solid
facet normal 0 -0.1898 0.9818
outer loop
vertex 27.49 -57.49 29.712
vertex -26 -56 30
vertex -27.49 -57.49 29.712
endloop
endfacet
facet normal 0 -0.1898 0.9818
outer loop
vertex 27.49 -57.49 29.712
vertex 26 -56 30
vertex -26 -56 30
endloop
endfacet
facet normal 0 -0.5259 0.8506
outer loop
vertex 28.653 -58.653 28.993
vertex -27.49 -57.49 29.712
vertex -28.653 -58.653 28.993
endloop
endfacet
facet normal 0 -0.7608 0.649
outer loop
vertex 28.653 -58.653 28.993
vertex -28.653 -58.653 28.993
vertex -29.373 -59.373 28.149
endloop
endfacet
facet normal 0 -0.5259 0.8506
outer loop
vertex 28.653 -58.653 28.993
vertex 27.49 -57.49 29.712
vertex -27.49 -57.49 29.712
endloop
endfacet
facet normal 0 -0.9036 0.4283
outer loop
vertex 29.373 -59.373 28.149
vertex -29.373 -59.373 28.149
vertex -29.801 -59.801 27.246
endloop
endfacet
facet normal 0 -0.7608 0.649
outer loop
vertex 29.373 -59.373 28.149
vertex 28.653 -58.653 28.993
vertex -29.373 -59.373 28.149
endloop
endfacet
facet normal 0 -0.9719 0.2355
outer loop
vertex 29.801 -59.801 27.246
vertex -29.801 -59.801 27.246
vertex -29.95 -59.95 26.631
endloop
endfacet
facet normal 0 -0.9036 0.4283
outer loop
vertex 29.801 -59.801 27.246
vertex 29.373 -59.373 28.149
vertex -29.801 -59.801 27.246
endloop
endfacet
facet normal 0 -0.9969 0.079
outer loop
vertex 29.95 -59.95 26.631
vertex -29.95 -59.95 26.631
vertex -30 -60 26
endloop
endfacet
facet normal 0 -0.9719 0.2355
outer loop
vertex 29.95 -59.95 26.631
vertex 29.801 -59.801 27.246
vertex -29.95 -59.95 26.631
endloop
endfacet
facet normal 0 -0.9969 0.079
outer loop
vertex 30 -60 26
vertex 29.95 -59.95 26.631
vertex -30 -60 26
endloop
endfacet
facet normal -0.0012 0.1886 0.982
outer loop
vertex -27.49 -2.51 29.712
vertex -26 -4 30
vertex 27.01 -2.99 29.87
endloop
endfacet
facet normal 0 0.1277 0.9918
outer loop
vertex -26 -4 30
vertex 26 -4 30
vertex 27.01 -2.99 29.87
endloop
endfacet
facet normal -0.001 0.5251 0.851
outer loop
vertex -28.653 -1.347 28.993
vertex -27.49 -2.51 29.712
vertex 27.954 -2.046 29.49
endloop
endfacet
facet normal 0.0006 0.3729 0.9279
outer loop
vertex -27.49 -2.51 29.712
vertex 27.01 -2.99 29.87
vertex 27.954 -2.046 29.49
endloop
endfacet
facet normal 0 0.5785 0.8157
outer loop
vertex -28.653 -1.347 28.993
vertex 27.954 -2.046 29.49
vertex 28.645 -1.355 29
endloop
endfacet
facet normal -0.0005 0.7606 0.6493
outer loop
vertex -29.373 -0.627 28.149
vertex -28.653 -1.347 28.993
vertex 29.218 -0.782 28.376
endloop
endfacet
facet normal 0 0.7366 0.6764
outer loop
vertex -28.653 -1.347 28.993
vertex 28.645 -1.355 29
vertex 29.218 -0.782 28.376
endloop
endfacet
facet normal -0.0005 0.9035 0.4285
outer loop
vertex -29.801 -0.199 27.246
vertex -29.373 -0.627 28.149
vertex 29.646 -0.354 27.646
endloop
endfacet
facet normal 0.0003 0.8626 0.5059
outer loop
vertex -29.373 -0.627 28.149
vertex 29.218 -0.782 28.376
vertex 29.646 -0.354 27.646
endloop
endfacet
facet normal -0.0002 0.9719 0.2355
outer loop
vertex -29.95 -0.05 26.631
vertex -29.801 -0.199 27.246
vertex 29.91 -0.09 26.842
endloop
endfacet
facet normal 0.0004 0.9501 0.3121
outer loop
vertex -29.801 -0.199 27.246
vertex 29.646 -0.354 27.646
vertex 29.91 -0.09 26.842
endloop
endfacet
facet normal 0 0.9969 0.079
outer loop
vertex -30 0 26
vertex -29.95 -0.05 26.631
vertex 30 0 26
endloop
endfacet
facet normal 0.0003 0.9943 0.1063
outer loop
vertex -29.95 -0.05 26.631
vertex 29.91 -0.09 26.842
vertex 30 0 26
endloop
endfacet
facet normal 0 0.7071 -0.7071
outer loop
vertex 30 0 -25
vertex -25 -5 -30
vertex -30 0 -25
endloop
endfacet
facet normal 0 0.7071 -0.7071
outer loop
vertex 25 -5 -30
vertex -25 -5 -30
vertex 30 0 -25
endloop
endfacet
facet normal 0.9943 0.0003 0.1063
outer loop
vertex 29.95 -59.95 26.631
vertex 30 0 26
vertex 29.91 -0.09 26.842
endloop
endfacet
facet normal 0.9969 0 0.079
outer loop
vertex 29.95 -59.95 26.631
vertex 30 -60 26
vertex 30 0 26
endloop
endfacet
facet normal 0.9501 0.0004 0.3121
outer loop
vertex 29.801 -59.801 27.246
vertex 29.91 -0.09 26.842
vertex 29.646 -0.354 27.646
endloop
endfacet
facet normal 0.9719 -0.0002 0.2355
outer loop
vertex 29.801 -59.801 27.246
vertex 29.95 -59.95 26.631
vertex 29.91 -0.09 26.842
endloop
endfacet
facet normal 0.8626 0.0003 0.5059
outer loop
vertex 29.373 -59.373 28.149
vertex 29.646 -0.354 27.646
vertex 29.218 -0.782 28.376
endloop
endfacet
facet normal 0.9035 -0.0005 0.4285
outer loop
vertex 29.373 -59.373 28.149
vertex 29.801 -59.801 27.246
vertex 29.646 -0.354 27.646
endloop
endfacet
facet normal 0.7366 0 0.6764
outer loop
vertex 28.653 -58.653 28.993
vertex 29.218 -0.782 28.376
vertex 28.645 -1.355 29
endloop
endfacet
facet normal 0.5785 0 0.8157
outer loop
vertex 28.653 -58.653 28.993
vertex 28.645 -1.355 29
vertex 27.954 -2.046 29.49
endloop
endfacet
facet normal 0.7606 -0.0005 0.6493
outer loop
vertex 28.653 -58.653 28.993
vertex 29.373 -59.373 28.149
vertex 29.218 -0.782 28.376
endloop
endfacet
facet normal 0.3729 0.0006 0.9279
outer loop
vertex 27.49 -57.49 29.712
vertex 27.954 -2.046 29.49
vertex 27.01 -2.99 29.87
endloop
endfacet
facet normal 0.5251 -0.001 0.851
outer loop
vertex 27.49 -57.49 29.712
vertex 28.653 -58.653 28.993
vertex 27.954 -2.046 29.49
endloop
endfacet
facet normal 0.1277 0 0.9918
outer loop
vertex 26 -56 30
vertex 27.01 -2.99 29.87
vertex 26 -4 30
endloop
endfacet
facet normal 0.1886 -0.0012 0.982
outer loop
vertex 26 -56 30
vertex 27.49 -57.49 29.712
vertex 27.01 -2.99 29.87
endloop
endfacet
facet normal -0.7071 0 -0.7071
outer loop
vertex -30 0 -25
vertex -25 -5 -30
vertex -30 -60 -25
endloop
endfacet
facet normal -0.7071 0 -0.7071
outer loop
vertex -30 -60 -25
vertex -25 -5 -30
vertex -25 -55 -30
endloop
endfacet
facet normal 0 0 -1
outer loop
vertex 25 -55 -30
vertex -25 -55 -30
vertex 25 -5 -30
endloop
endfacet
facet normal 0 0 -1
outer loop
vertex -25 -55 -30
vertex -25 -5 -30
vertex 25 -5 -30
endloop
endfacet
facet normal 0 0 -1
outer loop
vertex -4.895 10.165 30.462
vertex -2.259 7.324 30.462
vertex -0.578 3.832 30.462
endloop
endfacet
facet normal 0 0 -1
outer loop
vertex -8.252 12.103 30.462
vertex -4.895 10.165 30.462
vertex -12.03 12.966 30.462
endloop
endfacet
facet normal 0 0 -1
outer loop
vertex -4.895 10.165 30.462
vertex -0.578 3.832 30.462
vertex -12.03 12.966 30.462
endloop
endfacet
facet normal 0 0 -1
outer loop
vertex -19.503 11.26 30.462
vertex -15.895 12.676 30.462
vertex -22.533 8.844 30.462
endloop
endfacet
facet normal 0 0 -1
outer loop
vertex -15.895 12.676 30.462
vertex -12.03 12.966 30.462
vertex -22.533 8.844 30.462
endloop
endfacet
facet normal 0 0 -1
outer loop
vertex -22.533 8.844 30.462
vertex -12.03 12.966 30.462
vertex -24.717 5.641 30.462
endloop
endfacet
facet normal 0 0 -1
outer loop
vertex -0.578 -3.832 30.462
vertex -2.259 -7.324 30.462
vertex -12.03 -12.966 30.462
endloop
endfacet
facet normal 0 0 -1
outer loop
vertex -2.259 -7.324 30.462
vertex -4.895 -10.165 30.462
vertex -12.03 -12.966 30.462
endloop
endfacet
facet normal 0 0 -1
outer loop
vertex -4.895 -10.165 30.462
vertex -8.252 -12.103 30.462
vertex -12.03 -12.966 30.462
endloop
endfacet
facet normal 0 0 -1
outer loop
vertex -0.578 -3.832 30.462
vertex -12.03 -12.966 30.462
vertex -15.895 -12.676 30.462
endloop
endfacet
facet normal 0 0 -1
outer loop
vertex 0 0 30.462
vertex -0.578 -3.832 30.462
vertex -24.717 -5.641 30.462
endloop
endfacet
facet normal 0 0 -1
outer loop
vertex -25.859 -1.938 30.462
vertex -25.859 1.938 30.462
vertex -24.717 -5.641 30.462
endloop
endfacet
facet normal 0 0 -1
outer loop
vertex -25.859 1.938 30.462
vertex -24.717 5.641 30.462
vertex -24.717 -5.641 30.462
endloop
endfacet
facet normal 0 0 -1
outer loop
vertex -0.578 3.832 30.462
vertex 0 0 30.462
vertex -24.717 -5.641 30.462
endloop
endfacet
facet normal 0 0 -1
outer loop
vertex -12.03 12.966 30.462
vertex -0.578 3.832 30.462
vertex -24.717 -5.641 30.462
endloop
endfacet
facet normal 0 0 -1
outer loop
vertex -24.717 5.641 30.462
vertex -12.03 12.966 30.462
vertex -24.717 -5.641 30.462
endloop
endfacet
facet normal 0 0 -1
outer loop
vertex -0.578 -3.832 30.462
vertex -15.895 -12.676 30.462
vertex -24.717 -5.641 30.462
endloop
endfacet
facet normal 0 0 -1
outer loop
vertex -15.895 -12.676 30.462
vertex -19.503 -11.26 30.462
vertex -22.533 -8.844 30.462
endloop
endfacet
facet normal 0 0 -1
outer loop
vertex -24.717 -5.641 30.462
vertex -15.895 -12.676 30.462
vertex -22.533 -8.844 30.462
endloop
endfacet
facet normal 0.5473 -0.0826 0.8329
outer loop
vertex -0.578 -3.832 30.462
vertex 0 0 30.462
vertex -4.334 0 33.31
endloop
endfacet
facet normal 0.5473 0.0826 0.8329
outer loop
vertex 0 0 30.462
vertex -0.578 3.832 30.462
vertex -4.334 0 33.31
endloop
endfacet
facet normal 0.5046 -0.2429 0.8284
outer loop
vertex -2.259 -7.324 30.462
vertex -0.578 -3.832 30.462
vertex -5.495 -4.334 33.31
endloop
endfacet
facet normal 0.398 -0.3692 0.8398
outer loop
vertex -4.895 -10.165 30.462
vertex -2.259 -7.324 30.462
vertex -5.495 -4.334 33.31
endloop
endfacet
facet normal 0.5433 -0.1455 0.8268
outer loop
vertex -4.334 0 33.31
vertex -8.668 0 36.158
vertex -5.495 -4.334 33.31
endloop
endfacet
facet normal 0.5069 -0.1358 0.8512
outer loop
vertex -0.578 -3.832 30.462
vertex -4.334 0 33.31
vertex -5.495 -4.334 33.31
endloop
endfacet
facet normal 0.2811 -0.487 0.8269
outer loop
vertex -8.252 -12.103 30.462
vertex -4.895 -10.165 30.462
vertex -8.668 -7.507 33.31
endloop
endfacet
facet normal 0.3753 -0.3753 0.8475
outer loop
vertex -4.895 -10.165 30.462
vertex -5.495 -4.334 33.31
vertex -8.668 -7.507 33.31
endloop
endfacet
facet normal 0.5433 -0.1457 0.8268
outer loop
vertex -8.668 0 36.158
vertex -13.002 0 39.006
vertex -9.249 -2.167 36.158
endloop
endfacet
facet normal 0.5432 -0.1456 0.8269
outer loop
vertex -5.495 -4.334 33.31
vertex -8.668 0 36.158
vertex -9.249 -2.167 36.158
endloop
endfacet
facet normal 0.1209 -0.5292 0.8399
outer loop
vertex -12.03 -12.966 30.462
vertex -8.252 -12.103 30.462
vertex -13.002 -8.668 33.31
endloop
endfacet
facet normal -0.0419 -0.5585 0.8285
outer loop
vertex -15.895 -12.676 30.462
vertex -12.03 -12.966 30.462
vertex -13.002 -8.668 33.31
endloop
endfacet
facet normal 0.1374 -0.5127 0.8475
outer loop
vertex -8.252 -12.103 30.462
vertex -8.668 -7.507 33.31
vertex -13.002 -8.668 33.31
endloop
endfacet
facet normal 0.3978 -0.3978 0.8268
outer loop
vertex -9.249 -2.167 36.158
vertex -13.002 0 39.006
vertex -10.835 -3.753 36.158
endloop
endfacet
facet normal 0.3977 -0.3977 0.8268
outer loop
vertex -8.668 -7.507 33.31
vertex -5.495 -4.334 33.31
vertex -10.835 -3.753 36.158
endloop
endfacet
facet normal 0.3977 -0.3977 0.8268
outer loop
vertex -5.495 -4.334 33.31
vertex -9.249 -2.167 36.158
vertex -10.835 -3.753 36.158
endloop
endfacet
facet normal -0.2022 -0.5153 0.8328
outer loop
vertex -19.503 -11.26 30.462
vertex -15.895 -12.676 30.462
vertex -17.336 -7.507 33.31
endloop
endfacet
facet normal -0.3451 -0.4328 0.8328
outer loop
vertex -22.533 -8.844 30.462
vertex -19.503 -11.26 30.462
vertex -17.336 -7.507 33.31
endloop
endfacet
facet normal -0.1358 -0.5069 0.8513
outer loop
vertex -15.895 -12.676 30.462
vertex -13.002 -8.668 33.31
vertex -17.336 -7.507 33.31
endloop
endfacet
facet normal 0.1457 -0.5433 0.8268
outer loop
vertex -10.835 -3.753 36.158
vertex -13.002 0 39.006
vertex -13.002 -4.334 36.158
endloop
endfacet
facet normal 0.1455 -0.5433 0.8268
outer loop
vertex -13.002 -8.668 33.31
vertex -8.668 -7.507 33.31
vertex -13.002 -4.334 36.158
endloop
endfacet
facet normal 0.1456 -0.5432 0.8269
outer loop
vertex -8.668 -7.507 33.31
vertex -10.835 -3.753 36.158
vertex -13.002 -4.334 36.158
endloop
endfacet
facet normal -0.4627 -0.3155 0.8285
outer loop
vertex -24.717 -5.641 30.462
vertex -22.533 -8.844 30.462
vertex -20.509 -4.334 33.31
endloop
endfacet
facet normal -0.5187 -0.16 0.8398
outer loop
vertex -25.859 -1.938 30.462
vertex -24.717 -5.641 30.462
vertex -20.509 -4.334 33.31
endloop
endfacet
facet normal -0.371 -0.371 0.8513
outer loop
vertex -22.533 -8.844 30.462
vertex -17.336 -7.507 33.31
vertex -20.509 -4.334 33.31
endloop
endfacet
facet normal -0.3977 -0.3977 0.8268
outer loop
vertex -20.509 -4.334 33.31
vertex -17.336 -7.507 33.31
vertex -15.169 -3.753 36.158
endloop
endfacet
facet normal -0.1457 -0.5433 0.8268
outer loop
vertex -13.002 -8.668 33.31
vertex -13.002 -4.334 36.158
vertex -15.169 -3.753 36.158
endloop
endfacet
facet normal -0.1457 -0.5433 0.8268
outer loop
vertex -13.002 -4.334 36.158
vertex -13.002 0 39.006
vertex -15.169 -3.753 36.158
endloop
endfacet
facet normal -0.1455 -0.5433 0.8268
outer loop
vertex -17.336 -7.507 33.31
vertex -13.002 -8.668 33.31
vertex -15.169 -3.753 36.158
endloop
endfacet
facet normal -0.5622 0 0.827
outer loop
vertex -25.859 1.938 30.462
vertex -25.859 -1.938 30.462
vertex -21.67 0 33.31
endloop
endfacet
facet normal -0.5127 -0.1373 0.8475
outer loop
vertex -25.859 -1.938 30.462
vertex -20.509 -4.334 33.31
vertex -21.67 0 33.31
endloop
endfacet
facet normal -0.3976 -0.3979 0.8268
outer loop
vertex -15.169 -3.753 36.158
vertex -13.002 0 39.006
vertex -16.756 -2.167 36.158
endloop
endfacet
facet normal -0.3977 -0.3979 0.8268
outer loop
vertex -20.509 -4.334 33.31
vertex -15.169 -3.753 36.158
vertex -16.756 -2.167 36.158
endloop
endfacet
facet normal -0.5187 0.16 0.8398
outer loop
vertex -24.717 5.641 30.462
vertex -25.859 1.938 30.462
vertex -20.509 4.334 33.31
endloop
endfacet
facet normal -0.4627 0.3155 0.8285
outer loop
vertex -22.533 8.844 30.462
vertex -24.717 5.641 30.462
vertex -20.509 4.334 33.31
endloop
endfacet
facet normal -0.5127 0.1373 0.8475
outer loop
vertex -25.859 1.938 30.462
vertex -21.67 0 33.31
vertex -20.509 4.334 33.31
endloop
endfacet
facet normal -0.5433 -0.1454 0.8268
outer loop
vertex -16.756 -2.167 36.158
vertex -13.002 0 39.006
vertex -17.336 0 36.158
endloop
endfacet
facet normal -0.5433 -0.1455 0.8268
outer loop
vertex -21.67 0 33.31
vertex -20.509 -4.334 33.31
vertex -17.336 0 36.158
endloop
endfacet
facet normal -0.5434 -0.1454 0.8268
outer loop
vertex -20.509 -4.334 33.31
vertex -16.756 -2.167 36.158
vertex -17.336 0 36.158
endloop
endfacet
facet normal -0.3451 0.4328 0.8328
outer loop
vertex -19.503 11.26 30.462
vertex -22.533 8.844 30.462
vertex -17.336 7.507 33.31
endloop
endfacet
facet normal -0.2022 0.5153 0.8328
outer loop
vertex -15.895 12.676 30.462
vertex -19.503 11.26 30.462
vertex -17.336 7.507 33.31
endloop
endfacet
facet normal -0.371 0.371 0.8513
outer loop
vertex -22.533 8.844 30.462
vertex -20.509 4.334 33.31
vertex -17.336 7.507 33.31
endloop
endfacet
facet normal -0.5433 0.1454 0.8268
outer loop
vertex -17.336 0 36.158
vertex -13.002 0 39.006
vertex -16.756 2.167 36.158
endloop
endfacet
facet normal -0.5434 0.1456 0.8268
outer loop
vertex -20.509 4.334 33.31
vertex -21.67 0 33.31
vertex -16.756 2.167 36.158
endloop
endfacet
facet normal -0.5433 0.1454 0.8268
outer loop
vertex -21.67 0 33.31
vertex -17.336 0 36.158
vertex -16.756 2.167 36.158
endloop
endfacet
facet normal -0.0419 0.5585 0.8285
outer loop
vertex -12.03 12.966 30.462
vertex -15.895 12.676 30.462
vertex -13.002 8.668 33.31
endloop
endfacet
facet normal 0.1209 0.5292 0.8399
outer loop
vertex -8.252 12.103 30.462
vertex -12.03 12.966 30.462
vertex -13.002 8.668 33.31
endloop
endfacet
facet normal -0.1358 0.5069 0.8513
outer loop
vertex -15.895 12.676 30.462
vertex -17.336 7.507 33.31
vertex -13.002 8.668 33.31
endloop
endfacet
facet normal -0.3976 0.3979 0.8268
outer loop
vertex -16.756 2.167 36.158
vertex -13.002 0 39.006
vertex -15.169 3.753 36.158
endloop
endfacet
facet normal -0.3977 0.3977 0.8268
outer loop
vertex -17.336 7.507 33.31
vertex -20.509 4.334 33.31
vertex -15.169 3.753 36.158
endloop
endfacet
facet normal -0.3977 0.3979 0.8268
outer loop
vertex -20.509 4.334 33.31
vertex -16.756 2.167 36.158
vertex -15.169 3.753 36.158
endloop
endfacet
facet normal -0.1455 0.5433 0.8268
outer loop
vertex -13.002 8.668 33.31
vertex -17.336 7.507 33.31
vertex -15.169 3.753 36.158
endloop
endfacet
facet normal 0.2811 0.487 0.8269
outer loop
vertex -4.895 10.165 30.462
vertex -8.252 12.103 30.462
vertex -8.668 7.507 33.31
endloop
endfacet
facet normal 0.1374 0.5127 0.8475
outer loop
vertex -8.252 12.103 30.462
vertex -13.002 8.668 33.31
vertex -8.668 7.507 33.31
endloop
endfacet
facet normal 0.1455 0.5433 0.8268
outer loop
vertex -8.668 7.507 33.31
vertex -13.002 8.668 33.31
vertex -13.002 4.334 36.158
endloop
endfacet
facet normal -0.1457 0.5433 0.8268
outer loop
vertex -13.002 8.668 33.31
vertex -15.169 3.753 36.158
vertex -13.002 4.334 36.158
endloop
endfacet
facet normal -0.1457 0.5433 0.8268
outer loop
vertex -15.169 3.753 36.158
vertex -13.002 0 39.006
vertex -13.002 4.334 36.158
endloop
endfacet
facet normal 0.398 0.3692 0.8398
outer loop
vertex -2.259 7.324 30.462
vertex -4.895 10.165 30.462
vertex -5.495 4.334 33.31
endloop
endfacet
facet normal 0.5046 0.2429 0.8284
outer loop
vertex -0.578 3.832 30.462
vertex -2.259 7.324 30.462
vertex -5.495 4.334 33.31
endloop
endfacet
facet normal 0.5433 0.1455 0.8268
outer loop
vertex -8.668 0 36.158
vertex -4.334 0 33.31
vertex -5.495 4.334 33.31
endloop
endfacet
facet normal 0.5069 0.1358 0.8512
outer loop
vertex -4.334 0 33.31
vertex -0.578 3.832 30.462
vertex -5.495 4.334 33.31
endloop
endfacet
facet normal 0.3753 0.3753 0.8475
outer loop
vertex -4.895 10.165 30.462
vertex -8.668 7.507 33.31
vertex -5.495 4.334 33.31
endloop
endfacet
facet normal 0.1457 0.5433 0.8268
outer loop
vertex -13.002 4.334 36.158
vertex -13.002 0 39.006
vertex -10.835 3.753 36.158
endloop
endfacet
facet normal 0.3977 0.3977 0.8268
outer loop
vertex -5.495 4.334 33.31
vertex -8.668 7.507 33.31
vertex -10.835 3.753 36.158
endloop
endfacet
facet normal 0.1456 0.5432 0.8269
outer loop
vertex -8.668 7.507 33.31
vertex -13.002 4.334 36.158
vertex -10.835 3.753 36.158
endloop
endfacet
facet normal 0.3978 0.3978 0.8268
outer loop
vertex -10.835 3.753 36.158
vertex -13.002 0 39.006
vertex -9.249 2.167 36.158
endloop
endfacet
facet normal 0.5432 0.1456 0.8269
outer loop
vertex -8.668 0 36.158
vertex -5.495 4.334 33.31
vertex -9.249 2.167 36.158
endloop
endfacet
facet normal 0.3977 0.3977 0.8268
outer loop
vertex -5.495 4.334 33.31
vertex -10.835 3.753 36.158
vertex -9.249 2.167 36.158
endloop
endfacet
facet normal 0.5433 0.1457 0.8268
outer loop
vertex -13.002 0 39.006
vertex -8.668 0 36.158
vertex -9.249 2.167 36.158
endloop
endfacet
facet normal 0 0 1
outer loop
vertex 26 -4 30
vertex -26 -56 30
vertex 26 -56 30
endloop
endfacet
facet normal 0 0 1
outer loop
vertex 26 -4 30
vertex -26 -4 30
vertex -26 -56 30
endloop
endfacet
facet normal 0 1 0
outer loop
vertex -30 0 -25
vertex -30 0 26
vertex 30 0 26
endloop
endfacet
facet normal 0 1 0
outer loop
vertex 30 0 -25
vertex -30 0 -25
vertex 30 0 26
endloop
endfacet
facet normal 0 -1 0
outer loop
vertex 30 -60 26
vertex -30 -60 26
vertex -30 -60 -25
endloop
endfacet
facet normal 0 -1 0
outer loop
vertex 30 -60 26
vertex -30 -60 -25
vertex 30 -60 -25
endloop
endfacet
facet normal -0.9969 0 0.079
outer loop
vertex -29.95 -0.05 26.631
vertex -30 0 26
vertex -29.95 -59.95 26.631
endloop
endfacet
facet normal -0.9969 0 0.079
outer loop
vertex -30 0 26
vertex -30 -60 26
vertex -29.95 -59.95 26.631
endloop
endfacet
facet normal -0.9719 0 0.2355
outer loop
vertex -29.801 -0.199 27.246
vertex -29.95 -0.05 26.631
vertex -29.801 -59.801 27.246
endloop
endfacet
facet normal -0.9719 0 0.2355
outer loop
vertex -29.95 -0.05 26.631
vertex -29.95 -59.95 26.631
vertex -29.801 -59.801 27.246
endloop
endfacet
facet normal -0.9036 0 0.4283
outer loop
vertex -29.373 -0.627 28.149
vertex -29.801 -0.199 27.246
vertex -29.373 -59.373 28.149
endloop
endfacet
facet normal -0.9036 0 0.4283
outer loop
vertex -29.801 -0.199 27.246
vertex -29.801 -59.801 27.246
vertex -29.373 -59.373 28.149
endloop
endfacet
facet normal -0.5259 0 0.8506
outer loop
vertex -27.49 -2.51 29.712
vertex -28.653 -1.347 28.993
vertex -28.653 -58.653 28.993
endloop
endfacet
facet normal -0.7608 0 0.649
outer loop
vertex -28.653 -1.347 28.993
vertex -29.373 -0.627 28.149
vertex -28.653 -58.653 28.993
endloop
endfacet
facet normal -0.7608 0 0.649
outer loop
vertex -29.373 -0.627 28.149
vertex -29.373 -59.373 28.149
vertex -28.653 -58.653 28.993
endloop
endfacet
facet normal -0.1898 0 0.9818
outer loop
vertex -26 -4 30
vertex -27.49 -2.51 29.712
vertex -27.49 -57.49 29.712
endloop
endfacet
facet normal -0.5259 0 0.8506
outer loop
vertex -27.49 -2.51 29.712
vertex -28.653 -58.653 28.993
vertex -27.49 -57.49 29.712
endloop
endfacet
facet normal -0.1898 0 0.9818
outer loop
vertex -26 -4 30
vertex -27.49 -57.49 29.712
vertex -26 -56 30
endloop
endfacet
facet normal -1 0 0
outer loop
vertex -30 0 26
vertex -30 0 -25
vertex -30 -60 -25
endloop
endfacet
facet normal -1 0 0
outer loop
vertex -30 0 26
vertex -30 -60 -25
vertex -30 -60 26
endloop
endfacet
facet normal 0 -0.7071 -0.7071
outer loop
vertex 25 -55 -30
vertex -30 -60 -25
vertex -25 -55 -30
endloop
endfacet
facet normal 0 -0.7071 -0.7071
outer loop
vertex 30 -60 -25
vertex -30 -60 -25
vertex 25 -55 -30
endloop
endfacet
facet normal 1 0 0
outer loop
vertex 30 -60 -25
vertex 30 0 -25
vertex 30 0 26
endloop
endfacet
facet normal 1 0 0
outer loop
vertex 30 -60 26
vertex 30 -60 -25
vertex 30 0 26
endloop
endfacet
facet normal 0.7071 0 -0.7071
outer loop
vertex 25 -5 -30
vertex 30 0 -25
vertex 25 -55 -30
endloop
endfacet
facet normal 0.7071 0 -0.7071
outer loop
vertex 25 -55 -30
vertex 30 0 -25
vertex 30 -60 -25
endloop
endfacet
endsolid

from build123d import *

# Parameters (mm, degrees)
F0_W     = 60
F0_H     = 60
F1_DEPTH = 60
F2_R     = 4
F3_SIZE  = 5


with BuildPart() as f1:
    # F0 (on Front) → F1 (new body)
    with BuildSketch(Plane.XZ):
        Rectangle(F0_W, F0_H)
    extrude(amount=F1_DEPTH)

    # F2
    f2_edges = [f1.edges().sort_by_distance(p)[0] for p in [
        (0, -60, 30),
        (30, -30, 30),
        (0, 0, 30),
        (-30, -30, 30),
    ]]
    fillet(f2_edges, radius=F2_R)

    # F3
    f3_edges = [f1.edges().sort_by_distance(p)[0] for p in [
        (0, -60, -30),
        (30, -30, -30),
        (0, 0, -30),
        (-30, -30, -30),
    ]]
    chamfer(f3_edges, length=F3_SIZE)


with BuildPart() as f5:
    # F4 (on Front) → F5 (revolve)
    with BuildSketch(Plane.XZ):
        Polygon((0, 30.462176), (-13.002147, 39.006442), (-13.002147, 30.462176), align=None)
    revolve(axis=Axis((-13.002147, 0, 34.734309), (0, 0, -1)))


solid = Compound([f1.part, f5.part])
